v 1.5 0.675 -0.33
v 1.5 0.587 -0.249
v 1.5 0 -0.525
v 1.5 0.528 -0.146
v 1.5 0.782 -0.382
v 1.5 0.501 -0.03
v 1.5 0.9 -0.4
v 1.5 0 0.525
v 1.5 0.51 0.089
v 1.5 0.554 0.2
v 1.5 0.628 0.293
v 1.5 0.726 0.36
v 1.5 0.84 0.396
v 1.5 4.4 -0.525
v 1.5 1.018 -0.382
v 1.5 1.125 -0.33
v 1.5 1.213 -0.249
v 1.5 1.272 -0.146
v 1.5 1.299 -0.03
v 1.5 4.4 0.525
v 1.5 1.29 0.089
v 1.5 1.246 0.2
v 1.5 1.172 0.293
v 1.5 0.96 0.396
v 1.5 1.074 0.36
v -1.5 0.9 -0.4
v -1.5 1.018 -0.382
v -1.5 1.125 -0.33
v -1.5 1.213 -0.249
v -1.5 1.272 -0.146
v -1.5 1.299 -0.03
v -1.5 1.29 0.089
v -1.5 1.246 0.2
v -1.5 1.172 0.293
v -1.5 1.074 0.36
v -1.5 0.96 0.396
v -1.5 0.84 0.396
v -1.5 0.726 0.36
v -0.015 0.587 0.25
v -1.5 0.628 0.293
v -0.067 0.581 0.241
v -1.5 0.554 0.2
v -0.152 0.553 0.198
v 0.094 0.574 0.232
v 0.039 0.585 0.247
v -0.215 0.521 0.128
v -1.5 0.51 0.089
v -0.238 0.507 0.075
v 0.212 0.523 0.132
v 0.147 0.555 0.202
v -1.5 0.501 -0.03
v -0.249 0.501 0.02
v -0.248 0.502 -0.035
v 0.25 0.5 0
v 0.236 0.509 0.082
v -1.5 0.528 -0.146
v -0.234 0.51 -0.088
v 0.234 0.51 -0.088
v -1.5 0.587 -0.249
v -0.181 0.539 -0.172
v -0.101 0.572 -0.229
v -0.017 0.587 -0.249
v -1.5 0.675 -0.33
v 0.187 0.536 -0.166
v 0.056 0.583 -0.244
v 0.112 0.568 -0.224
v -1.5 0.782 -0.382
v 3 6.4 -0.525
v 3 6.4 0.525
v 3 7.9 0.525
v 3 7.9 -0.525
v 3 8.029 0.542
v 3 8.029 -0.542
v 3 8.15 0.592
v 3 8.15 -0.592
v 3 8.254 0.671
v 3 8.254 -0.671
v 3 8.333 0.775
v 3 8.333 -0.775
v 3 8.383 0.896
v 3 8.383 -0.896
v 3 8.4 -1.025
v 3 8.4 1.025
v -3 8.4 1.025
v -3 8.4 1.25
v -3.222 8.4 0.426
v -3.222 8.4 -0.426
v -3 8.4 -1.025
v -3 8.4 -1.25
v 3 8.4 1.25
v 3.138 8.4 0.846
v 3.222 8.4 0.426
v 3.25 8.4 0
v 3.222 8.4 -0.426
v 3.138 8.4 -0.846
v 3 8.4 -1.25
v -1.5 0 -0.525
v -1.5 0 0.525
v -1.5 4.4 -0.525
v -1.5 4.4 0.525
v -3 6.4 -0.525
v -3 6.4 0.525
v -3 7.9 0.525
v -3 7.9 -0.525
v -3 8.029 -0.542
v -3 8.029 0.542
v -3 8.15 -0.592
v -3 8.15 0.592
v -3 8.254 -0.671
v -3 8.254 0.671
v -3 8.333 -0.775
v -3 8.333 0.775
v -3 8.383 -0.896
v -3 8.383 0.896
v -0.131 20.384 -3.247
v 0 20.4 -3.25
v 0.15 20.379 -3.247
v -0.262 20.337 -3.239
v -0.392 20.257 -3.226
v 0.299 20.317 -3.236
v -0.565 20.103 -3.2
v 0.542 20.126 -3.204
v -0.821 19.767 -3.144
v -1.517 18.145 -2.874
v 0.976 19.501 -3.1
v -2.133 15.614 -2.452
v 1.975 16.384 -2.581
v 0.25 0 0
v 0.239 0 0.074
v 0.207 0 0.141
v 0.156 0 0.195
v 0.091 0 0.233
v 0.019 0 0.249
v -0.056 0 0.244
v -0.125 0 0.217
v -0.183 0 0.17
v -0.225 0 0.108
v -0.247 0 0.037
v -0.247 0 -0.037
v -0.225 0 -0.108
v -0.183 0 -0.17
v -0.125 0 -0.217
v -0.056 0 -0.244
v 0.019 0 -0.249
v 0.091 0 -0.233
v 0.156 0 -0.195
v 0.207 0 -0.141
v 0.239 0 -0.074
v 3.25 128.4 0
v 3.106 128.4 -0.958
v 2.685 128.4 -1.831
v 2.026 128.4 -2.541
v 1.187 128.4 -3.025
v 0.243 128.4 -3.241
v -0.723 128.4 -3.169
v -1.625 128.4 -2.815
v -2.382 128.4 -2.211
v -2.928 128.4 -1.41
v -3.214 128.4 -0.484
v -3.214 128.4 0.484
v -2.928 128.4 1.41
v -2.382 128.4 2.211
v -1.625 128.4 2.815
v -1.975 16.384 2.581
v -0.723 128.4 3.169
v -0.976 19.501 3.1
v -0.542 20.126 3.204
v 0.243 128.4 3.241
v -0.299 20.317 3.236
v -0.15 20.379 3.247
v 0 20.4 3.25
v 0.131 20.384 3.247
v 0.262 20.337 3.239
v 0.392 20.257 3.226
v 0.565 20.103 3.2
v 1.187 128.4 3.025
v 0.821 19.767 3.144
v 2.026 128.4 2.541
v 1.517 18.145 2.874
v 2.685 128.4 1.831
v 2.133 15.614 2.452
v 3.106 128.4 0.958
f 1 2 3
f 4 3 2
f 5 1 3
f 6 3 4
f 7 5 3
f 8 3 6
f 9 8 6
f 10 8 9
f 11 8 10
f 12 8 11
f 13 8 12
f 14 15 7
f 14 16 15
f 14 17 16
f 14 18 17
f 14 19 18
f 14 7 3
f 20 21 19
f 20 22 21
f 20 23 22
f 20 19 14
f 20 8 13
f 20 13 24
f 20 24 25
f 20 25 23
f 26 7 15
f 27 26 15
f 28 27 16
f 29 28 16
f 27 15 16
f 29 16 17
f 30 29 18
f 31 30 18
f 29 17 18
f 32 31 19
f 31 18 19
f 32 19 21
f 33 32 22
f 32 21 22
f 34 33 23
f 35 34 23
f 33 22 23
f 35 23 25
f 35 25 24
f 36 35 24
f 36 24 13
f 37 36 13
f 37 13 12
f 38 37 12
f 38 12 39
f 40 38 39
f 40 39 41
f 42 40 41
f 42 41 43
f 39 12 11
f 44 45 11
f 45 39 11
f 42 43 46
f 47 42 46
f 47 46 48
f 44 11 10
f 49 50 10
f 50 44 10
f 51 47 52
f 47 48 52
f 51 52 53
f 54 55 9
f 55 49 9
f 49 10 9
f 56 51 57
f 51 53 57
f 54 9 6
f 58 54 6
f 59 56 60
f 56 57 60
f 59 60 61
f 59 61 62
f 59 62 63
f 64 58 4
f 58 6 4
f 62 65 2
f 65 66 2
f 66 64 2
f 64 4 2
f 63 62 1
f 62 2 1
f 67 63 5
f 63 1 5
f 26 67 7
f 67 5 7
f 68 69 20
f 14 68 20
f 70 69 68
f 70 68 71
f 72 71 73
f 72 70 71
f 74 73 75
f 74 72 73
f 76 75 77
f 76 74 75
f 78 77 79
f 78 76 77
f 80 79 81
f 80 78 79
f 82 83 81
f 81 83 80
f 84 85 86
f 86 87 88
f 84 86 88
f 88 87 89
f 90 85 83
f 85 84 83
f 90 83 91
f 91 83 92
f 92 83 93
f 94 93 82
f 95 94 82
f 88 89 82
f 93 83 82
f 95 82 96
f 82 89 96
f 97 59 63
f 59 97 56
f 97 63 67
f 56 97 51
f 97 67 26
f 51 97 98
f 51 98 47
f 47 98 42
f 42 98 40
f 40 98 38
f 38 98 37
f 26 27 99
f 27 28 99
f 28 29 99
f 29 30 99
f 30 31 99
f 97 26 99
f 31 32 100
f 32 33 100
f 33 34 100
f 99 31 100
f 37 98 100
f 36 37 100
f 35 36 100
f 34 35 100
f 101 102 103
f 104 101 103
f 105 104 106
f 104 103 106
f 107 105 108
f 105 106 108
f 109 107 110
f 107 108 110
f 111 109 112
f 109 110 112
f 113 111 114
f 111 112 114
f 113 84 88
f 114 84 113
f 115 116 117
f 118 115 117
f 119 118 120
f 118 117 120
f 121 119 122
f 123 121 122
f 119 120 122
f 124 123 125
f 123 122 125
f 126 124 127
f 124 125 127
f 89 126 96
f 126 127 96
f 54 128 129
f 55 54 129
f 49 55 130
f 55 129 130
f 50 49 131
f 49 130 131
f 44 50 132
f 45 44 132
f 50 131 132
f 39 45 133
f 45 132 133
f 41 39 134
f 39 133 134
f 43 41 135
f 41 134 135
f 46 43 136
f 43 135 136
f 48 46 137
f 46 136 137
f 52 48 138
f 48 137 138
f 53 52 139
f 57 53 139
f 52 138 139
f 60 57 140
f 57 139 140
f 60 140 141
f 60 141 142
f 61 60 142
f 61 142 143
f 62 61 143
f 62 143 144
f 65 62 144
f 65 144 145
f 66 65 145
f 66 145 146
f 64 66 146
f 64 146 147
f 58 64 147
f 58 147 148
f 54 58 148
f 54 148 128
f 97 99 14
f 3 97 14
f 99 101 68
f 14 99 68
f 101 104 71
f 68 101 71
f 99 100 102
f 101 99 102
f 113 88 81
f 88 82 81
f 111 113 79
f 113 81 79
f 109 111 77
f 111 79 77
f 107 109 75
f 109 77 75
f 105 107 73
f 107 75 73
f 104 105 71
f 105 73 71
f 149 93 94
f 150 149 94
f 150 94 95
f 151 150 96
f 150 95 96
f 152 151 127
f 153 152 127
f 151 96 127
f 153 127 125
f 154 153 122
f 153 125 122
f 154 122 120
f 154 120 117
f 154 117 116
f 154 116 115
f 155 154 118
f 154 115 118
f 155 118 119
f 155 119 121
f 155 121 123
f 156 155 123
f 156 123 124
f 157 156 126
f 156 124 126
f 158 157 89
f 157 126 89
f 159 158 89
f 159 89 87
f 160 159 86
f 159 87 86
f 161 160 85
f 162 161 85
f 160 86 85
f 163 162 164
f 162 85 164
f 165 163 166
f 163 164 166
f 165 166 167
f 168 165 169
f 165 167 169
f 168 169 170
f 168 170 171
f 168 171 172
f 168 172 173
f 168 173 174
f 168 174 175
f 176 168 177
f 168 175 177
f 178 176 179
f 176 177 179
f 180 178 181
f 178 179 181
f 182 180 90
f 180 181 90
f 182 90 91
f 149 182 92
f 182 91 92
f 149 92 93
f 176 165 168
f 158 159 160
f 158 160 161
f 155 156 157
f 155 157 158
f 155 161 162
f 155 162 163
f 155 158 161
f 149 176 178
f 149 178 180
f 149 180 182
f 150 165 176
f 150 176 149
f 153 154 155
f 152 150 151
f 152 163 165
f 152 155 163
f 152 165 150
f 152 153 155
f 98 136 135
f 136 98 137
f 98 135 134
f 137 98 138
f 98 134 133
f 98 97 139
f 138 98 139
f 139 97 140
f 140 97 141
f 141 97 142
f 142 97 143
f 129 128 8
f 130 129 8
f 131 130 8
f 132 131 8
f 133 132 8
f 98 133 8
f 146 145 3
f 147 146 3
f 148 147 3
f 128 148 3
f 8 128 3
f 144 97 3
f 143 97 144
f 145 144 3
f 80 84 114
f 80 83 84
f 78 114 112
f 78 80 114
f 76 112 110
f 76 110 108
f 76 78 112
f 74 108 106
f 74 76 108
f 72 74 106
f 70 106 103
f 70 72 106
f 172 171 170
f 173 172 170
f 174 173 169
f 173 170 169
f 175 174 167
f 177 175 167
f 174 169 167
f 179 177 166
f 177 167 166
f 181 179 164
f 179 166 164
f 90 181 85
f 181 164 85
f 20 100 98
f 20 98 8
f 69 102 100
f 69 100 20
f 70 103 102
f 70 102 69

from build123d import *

# Parameters (mm, degrees)
SKETCH1_W           = 3
SKETCH1_H           = 1.05
BOSS_EXTRUDE1_DEPTH = 2.4
SKETCH2_R           = 0.4
CUT_EXTRUDE1_DEPTH  = 3
SKETCH3_W           = 6
SKETCH3_H           = 2
SKETCH3_W_2         = 3
BOSS_EXTRUDE2_DEPTH = 1.05
CUT_EXTRUDE2_REACH  = 10.4
SKETCH4_R           = 0.25
SKETCH5_R           = 3.25
BOSS_EXTRUDE3_DEPTH = 120
FILLET2_R           = 0.5
CUT_EXTRUDE3_DEPTH  = 3.25


with BuildPart() as part:
    # Sketch1 → Boss-Extrude1 (new body)
    with BuildSketch(Plane(origin=(0, 0, 0), x_dir=(1, 0, 0), z_dir=(0, 1, 0))):
        Rectangle(SKETCH1_W, SKETCH1_H)
    extrude(amount=BOSS_EXTRUDE1_DEPTH)

    # Sketch2 → Cut-Extrude1 (cut)
    with BuildSketch(Plane(origin=(1.5, 0, 0), x_dir=(0, 0, -1), z_dir=(1, 0, 0))):
        with Locations((0, 0.9)):
            Circle(SKETCH2_R)
    extrude(amount=-CUT_EXTRUDE1_DEPTH, mode=Mode.SUBTRACT)

    # Sketch3 → Boss-Extrude2 (add)
    with BuildSketch(Plane.XY.offset(0.525)):
        with Locations((0, 7.4)):
            Rectangle(SKETCH3_W, SKETCH3_H)
        Polygon((3, 6.4), (1.5, 4.4), (-1.5, 4.4), (-3, 6.4), align=None)
        with Locations((0, 3.4)):
            Rectangle(SKETCH3_W_2, SKETCH3_H)
    extrude(amount=-BOSS_EXTRUDE2_DEPTH)

    # Sketch4 → Cut-Extrude2 (cut, up to next)
    with BuildSketch(Plane.XZ, mode=Mode.PRIVATE) as cut_extrude2_sk1:
        Circle(SKETCH4_R)
    cut_extrude2_tool1 = extrude(cut_extrude2_sk1.sketch, amount=-CUT_EXTRUDE2_REACH, mode=Mode.PRIVATE) & part.part
    add(cut_extrude2_tool1.solids().sort_by_distance((0, 0, 0))[0], mode=Mode.SUBTRACT)

    # Sketch5 → Boss-Extrude3 (add)
    with BuildSketch(Plane(origin=(0, 8.4, 0), x_dir=(1, 0, 0), z_dir=(0, 1, 0))):
        Circle(SKETCH5_R)
    extrude(amount=BOSS_EXTRUDE3_DEPTH)

    # Fillet2
    fillet2_edges = [part.edges().sort_by_distance(p)[0] for p in [
        (0, 8.4, -0.525),
        (0, 8.4, 0.525),
    ]]
    fillet(fillet2_edges, radius=FILLET2_R)

    # Sketch6 → Cut-Extrude3 (cut, symmetric)
    with BuildSketch(Plane(origin=(0, 0, 0), x_dir=(0, 0, -1), z_dir=(1, 0, 0))):
        Polygon((-3.25, 8.4), (-3.25, 20.4), (-1.25, 8.4), align=None)
        Polygon((3.25, 8.4), (3.25, 20.4), (1.25, 8.4), align=None)
    extrude(amount=CUT_EXTRUDE3_DEPTH, both=True, mode=Mode.SUBTRACT)


solid = part.part
